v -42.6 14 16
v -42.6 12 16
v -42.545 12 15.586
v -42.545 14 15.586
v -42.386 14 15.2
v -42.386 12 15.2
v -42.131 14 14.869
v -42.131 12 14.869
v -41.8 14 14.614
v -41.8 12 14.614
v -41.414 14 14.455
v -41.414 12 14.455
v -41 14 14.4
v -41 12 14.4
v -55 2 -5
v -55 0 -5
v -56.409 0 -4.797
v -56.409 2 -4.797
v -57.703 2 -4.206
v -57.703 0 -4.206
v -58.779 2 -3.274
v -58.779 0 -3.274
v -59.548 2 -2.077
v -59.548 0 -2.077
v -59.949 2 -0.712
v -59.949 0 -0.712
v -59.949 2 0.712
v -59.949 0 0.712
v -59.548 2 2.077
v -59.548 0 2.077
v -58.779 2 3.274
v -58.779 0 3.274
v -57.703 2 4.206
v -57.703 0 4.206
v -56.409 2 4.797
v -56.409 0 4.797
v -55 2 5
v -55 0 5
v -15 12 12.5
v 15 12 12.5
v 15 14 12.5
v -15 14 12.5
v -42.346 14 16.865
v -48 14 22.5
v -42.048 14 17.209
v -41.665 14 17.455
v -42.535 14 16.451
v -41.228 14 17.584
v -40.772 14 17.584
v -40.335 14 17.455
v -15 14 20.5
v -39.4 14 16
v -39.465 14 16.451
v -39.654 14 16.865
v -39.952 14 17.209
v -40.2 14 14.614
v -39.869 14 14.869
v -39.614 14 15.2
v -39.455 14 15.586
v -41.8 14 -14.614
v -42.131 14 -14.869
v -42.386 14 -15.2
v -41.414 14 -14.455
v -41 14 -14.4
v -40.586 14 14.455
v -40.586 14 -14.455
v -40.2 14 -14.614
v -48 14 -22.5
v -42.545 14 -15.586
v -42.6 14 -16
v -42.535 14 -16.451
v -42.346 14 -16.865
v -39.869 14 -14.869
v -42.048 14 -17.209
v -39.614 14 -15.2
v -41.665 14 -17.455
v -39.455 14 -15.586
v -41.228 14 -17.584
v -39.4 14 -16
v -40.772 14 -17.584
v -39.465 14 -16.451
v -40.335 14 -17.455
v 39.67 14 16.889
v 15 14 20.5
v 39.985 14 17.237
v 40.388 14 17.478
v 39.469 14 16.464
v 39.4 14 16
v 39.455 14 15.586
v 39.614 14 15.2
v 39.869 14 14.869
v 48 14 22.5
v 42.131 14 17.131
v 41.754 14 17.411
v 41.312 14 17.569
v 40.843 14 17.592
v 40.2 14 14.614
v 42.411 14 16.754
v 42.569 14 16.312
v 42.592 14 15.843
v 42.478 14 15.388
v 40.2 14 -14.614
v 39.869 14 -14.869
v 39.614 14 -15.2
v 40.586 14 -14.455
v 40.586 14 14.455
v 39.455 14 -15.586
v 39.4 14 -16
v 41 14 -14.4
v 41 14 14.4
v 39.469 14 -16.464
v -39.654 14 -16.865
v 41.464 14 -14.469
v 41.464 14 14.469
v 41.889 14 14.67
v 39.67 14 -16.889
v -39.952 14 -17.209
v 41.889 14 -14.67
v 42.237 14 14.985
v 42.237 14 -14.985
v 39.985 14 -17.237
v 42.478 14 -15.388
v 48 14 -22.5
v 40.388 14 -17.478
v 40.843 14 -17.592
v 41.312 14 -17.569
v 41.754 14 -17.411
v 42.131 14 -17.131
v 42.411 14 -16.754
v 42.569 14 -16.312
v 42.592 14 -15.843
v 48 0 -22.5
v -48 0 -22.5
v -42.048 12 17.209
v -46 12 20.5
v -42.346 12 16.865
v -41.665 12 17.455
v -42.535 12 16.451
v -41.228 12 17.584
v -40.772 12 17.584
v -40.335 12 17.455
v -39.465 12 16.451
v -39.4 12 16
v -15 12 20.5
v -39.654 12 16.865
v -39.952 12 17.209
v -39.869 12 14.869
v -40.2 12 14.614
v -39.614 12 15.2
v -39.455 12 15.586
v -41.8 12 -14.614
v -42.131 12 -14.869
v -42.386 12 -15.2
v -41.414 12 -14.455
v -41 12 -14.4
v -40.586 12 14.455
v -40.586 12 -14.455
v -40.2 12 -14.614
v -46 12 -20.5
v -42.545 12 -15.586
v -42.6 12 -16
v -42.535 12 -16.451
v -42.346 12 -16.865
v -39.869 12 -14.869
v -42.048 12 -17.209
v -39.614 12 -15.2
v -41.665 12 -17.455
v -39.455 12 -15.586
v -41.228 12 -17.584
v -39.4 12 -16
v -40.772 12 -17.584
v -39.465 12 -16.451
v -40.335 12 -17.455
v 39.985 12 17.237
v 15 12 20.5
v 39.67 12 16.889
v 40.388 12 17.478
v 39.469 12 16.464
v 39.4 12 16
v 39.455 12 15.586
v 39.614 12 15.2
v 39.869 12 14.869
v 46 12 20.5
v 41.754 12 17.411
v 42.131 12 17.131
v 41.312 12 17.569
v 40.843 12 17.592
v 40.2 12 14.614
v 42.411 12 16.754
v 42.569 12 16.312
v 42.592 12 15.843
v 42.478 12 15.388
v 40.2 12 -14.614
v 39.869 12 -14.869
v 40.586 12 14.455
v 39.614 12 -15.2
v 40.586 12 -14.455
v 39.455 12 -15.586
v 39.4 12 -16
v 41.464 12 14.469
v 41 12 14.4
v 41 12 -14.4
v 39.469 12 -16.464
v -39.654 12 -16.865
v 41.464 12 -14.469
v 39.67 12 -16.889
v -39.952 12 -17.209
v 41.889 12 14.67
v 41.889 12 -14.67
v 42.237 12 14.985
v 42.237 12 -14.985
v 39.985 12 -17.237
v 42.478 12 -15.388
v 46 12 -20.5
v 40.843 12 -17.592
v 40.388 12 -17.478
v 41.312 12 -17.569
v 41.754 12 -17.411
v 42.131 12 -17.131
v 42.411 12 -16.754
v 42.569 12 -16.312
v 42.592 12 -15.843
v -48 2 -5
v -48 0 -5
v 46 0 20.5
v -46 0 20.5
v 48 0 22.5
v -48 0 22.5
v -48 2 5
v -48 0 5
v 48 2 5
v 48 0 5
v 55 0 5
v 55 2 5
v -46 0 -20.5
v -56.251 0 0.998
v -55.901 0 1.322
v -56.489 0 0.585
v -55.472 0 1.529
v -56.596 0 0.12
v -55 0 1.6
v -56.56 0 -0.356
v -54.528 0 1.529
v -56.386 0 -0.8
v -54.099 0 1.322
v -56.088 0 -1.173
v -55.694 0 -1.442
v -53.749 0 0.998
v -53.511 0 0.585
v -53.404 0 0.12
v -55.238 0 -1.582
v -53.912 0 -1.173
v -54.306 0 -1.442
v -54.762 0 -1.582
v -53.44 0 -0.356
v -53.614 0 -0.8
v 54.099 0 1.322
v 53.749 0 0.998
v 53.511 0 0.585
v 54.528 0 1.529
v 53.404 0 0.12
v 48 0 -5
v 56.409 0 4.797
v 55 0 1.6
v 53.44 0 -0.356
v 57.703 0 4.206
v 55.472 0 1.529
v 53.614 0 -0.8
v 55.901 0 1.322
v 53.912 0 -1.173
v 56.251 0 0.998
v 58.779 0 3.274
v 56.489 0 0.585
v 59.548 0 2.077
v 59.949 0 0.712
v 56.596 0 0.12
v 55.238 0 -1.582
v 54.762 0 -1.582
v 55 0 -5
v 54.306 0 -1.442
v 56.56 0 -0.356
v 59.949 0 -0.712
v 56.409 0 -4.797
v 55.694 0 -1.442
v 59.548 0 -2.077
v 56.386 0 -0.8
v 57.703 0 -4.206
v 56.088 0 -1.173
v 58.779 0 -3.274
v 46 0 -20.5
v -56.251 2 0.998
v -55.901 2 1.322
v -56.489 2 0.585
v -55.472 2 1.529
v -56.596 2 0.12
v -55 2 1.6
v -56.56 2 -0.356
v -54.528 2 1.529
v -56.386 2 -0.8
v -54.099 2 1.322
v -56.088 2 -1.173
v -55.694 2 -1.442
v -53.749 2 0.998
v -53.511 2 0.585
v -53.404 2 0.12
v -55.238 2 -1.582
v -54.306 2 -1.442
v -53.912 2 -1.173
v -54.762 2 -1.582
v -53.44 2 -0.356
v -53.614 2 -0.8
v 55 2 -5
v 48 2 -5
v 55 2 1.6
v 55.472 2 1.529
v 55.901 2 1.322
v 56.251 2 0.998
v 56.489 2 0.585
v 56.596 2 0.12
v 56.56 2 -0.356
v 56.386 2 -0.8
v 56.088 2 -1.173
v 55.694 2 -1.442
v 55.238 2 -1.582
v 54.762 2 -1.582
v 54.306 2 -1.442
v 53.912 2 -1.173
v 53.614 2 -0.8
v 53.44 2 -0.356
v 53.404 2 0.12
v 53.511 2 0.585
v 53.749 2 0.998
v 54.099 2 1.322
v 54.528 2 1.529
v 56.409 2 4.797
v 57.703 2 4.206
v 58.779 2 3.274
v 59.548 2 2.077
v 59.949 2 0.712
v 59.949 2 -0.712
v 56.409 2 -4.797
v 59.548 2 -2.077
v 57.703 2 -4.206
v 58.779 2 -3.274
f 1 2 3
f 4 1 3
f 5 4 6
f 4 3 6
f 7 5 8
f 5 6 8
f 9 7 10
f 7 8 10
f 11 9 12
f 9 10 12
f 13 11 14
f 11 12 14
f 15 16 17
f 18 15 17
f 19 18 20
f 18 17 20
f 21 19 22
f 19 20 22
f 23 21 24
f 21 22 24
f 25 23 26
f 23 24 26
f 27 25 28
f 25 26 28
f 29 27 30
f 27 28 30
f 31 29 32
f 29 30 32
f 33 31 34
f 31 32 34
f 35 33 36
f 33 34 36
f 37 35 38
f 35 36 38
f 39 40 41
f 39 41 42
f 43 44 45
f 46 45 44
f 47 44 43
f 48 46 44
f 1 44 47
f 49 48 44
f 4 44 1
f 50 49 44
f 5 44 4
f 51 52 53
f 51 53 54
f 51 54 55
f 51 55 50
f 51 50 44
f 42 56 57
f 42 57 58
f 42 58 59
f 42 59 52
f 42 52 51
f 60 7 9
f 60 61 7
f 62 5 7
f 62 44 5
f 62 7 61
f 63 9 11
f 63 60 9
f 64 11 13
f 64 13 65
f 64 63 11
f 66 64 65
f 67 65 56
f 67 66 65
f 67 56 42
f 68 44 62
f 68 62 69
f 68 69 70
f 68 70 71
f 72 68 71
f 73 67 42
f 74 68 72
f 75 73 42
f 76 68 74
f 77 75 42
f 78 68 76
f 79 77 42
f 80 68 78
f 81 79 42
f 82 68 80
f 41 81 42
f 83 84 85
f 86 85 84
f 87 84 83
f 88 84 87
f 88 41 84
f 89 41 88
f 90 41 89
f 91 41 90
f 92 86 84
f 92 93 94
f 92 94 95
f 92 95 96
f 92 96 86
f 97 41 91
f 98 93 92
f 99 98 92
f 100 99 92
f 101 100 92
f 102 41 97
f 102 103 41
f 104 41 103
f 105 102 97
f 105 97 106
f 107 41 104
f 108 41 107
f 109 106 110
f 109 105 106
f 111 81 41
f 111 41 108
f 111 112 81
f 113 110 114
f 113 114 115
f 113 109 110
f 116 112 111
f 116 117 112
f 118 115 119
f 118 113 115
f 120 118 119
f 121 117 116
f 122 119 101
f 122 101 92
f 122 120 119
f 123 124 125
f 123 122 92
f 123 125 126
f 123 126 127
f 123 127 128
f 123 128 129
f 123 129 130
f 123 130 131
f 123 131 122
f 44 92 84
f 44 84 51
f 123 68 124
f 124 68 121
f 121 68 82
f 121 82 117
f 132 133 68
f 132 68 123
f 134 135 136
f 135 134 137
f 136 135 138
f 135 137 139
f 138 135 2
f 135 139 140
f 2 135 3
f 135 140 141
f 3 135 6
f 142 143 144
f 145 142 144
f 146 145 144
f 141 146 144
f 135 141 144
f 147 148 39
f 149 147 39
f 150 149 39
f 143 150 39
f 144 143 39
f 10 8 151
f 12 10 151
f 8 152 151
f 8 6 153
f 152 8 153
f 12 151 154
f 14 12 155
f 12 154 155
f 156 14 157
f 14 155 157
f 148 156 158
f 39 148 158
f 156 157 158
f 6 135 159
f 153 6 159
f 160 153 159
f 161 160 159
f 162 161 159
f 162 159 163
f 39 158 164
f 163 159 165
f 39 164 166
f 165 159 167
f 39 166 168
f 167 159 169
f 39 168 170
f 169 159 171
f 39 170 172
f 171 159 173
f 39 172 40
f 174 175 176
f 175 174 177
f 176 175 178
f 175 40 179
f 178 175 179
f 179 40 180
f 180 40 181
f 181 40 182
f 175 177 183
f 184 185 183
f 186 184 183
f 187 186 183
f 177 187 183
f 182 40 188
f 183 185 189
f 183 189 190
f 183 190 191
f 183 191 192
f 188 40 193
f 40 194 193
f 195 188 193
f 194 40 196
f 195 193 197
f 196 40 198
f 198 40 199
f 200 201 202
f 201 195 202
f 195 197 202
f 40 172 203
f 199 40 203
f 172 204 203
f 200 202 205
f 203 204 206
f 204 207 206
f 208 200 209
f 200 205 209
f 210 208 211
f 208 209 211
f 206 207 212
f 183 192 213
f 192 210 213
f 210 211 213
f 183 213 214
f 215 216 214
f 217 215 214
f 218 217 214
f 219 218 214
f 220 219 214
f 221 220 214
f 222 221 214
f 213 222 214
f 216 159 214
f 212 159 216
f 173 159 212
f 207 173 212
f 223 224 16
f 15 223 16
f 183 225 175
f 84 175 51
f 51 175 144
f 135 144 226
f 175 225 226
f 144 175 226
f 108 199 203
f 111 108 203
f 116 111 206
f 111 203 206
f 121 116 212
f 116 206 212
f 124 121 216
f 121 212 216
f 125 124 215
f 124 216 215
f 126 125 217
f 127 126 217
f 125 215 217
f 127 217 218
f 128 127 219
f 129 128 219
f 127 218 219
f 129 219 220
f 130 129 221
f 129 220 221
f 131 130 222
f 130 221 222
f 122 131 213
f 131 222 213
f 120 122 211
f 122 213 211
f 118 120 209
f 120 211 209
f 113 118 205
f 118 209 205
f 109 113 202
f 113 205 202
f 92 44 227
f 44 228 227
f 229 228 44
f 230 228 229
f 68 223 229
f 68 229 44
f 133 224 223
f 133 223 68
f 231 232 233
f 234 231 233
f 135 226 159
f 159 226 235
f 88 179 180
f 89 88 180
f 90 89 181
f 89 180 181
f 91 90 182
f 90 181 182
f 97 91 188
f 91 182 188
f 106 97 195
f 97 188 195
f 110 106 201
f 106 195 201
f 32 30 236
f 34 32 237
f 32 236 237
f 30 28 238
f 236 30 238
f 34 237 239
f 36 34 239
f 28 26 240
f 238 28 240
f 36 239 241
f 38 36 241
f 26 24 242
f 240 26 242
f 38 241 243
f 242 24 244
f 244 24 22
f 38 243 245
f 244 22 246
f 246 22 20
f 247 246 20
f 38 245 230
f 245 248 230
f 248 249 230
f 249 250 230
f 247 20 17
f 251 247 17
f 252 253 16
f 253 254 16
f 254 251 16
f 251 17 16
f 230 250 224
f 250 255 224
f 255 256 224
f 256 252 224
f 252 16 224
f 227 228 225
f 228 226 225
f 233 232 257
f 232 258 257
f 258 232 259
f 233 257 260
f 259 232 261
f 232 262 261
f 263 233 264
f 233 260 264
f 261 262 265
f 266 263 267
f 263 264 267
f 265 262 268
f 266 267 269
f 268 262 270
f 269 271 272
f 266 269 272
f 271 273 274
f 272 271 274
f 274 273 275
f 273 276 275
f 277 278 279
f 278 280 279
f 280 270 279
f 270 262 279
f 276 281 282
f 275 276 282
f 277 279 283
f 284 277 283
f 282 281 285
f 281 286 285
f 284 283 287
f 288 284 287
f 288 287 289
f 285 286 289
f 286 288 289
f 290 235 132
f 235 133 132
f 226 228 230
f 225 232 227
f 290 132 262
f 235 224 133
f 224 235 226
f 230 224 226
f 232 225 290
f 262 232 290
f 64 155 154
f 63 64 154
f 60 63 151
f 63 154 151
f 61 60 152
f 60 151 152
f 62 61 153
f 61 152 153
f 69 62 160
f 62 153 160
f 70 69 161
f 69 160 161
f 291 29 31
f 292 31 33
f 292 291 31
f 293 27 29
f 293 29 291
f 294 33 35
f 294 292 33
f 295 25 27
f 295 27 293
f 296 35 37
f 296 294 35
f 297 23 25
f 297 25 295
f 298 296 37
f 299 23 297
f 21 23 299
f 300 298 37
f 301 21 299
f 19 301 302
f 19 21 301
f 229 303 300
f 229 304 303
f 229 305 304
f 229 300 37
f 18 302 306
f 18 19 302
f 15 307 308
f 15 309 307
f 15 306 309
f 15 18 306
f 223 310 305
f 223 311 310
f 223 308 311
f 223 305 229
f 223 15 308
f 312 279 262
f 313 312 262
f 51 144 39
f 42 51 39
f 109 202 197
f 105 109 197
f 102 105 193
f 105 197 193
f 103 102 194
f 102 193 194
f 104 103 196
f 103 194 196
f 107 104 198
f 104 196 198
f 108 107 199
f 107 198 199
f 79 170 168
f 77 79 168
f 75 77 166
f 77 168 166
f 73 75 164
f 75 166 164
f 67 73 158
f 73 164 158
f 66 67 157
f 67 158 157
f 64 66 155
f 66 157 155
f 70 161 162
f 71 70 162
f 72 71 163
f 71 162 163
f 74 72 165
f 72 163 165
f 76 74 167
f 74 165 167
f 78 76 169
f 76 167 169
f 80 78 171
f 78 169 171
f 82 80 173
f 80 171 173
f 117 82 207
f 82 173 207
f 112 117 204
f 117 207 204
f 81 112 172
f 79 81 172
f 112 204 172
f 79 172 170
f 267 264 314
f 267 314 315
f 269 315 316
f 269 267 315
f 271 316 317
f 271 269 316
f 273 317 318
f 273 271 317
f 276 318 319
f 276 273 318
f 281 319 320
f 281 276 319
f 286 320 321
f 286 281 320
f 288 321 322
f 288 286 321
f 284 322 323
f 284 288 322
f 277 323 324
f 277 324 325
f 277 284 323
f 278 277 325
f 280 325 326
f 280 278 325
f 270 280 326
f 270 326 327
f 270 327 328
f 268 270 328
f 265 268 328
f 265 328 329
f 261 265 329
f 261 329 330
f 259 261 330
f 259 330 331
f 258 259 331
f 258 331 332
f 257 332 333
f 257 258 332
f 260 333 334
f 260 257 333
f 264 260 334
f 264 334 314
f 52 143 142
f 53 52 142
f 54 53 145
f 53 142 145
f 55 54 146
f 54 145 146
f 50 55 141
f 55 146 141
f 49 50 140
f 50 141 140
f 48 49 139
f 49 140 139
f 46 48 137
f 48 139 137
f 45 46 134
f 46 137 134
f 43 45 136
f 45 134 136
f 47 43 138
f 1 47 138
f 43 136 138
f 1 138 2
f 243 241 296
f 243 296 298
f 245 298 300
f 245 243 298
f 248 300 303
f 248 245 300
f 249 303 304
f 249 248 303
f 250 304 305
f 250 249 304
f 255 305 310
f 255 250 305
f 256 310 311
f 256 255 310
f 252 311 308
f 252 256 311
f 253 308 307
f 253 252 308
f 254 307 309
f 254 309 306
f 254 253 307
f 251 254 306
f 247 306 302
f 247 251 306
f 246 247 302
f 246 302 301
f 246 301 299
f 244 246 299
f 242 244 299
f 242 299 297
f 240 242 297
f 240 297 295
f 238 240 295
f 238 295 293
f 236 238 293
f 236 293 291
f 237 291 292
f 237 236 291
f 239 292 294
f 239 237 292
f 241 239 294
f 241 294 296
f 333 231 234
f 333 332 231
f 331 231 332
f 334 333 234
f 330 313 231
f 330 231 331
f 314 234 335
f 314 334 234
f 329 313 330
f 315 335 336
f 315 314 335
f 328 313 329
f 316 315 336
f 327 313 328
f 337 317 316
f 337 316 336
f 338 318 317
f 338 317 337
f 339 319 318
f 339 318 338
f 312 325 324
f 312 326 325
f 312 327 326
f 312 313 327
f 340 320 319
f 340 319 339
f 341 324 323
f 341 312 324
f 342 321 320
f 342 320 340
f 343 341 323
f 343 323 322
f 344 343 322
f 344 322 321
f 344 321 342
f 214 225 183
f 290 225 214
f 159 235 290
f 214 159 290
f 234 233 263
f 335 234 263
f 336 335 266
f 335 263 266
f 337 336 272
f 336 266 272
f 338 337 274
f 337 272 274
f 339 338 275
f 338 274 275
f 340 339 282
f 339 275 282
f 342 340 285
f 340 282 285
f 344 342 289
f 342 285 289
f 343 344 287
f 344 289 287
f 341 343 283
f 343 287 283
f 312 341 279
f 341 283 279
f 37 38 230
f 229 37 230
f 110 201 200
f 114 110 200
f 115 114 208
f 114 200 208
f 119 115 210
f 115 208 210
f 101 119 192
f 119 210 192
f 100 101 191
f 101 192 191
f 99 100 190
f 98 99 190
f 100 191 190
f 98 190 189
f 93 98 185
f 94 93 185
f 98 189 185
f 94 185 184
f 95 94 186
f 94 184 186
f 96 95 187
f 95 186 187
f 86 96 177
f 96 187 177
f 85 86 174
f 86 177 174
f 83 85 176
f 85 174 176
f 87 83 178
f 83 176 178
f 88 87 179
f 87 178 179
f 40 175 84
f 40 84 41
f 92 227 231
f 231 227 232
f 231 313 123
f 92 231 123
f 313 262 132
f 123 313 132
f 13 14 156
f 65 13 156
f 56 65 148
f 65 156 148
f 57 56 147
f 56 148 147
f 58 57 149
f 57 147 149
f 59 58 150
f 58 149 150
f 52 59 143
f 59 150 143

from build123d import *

# Parameters (mm, degrees)
SKETCH1_R           = 1.6
BOSS_EXTRUDE1_DEPTH = 2
SKETCH2_W           = 96
SKETCH2_H           = 45
SKETCH2_W_2         = 92
SKETCH2_H_2         = 41
BOSS_EXTRUDE2_DEPTH = 10
SKETCH3_W           = 92
SKETCH3_H           = 41
CUT_EXTRUDE1_DEPTH  = 65.855608855
SKETCH4_W           = 96
SKETCH4_H           = 45
BOSS_EXTRUDE3_DEPTH = 2
CUT_EXTRUDE2_DEPTH  = 66.193941436
SKETCH6_W           = 30
SKETCH6_H           = 8
CUT_EXTRUDE4_DEPTH  = 66.193941436


with BuildPart() as part:
    # Sketch1 → Boss-Extrude1 (new body)
    with BuildSketch(Plane(origin=(0, 0, 0), x_dir=(1, 0, 0), z_dir=(0, 1, 0))):
        with BuildLine():
            Line((-48, 5), (-55, 5))
            ThreePointArc((-55, 5), (-60, 0), (-55, -5))
            Line((-55, -5), (-48, -5))
            Line((-48, -5), (-48, -22.5))
            Line((-48, -22.5), (48, -22.5))
            Line((48, -22.5), (48, -5))
            Line((48, -5), (55, -5))
            ThreePointArc((55, -5), (60, 0), (55, 5))
            Line((55, 5), (48, 5))
            Line((48, 5), (48, 22.5))
            Line((48, 22.5), (-48, 22.5))
            Line((-48, 22.5), (-48, 5))
        make_face()
        with Locations(Location((-55, 0, 0), (0, 0, 270))):
            Circle(SKETCH1_R, mode=Mode.SUBTRACT)
        with Locations(Location((55, 0, 0), (0, 0, 270))):
            Circle(SKETCH1_R, mode=Mode.SUBTRACT)
    extrude(amount=BOSS_EXTRUDE1_DEPTH)

    # Sketch2 → Boss-Extrude2 (add)
    with BuildSketch(Plane(origin=(0, 2, 0), x_dir=(1, 0, 0), z_dir=(0, 1, 0))):
        Rectangle(SKETCH2_W, SKETCH2_H)
        Rectangle(SKETCH2_W_2, SKETCH2_H_2, mode=Mode.SUBTRACT)
    extrude(amount=BOSS_EXTRUDE2_DEPTH)

    # Sketch3 → Cut-Extrude1 (cut, through all)
    with BuildSketch(Plane(origin=(0, 2, 0), x_dir=(1, 0, 0), z_dir=(0, 1, 0))):
        Rectangle(SKETCH3_W, SKETCH3_H)
    extrude(amount=-CUT_EXTRUDE1_DEPTH, mode=Mode.SUBTRACT)

    # Sketch4 → Boss-Extrude3 (add)
    with BuildSketch(Plane(origin=(0, 12, 0), x_dir=(1, 0, 0), z_dir=(0, 1, 0))):
        Rectangle(SKETCH4_W, SKETCH4_H)
    extrude(amount=BOSS_EXTRUDE3_DEPTH)

    # Sketch5 → Cut-Extrude2 (cut, through all)
    with BuildSketch(Plane(origin=(0, 12, 0), x_dir=(-1, 0, 0), z_dir=(0, -1, 0))):
        with BuildLine():
            ThreePointArc((42.6, -16), (42.13137085, -14.86862915), (41, -14.4))
            Line((41, -14.4), (41, -16))
            Line((41, -16), (39.4, -16))
            ThreePointArc((39.4, -16), (41, -17.6), (42.6, -16))
        make_face()
        with BuildLine():
            Line((41, -16), (41, -14.4))
            ThreePointArc((41, -14.4), (39.86862915, -14.86862915), (39.4, -16))
            Line((39.4, -16), (41, -16))
        make_face()
        with BuildLine():
            ThreePointArc((42.6, 16), (41, 17.6), (39.4, 16))
            Line((39.4, 16), (41, 16))
            Line((41, 16), (41, 14.4))
            ThreePointArc((41, 14.4), (42.13137085, 14.86862915), (42.6, 16))
        make_face()
        with BuildLine():
            Line((41, 16), (39.4, 16))
            ThreePointArc((39.4, 16), (39.86862915, 14.86862915), (41, 14.4))
            Line((41, 14.4), (41, 16))
        make_face()
        with BuildLine():
            ThreePointArc((-41, 14.4), (-39.86862915, 14.86862915), (-39.4, 16))
            Line((-39.4, 16), (-41, 16))
            Line((-41, 16), (-41, 14.4))
        make_face()
        with BuildLine():
            Line((-41, 16), (-39.4, 16))
            ThreePointArc((-39.4, 16), (-42.13137085, 17.13137085), (-41, 14.4))
            Line((-41, 14.4), (-41, 16))
        make_face()
        with BuildLine():
            ThreePointArc((-39.4, -16), (-39.86862915, -14.86862915), (-41, -14.4))
            Line((-41, -14.4), (-41, -16))
            Line((-41, -16), (-39.4, -16))
        make_face()
        with BuildLine():
            Line((-41, -16), (-41, -14.4))
            ThreePointArc((-41, -14.4), (-42.13137085, -17.13137085), (-39.4, -16))
            Line((-39.4, -16), (-41, -16))
        make_face()
    extrude(amount=-CUT_EXTRUDE2_DEPTH, mode=Mode.SUBTRACT)

    # Sketch6 → Cut-Extrude4 (cut, through all)
    with BuildSketch(Plane(origin=(0, 12, 0), x_dir=(-1, 0, 0), z_dir=(0, -1, 0))):
        with Locations((0, -16.5)):
            Rectangle(SKETCH6_W, SKETCH6_H)
    extrude(amount=-CUT_EXTRUDE4_DEPTH, mode=Mode.SUBTRACT)


solid = part.part
